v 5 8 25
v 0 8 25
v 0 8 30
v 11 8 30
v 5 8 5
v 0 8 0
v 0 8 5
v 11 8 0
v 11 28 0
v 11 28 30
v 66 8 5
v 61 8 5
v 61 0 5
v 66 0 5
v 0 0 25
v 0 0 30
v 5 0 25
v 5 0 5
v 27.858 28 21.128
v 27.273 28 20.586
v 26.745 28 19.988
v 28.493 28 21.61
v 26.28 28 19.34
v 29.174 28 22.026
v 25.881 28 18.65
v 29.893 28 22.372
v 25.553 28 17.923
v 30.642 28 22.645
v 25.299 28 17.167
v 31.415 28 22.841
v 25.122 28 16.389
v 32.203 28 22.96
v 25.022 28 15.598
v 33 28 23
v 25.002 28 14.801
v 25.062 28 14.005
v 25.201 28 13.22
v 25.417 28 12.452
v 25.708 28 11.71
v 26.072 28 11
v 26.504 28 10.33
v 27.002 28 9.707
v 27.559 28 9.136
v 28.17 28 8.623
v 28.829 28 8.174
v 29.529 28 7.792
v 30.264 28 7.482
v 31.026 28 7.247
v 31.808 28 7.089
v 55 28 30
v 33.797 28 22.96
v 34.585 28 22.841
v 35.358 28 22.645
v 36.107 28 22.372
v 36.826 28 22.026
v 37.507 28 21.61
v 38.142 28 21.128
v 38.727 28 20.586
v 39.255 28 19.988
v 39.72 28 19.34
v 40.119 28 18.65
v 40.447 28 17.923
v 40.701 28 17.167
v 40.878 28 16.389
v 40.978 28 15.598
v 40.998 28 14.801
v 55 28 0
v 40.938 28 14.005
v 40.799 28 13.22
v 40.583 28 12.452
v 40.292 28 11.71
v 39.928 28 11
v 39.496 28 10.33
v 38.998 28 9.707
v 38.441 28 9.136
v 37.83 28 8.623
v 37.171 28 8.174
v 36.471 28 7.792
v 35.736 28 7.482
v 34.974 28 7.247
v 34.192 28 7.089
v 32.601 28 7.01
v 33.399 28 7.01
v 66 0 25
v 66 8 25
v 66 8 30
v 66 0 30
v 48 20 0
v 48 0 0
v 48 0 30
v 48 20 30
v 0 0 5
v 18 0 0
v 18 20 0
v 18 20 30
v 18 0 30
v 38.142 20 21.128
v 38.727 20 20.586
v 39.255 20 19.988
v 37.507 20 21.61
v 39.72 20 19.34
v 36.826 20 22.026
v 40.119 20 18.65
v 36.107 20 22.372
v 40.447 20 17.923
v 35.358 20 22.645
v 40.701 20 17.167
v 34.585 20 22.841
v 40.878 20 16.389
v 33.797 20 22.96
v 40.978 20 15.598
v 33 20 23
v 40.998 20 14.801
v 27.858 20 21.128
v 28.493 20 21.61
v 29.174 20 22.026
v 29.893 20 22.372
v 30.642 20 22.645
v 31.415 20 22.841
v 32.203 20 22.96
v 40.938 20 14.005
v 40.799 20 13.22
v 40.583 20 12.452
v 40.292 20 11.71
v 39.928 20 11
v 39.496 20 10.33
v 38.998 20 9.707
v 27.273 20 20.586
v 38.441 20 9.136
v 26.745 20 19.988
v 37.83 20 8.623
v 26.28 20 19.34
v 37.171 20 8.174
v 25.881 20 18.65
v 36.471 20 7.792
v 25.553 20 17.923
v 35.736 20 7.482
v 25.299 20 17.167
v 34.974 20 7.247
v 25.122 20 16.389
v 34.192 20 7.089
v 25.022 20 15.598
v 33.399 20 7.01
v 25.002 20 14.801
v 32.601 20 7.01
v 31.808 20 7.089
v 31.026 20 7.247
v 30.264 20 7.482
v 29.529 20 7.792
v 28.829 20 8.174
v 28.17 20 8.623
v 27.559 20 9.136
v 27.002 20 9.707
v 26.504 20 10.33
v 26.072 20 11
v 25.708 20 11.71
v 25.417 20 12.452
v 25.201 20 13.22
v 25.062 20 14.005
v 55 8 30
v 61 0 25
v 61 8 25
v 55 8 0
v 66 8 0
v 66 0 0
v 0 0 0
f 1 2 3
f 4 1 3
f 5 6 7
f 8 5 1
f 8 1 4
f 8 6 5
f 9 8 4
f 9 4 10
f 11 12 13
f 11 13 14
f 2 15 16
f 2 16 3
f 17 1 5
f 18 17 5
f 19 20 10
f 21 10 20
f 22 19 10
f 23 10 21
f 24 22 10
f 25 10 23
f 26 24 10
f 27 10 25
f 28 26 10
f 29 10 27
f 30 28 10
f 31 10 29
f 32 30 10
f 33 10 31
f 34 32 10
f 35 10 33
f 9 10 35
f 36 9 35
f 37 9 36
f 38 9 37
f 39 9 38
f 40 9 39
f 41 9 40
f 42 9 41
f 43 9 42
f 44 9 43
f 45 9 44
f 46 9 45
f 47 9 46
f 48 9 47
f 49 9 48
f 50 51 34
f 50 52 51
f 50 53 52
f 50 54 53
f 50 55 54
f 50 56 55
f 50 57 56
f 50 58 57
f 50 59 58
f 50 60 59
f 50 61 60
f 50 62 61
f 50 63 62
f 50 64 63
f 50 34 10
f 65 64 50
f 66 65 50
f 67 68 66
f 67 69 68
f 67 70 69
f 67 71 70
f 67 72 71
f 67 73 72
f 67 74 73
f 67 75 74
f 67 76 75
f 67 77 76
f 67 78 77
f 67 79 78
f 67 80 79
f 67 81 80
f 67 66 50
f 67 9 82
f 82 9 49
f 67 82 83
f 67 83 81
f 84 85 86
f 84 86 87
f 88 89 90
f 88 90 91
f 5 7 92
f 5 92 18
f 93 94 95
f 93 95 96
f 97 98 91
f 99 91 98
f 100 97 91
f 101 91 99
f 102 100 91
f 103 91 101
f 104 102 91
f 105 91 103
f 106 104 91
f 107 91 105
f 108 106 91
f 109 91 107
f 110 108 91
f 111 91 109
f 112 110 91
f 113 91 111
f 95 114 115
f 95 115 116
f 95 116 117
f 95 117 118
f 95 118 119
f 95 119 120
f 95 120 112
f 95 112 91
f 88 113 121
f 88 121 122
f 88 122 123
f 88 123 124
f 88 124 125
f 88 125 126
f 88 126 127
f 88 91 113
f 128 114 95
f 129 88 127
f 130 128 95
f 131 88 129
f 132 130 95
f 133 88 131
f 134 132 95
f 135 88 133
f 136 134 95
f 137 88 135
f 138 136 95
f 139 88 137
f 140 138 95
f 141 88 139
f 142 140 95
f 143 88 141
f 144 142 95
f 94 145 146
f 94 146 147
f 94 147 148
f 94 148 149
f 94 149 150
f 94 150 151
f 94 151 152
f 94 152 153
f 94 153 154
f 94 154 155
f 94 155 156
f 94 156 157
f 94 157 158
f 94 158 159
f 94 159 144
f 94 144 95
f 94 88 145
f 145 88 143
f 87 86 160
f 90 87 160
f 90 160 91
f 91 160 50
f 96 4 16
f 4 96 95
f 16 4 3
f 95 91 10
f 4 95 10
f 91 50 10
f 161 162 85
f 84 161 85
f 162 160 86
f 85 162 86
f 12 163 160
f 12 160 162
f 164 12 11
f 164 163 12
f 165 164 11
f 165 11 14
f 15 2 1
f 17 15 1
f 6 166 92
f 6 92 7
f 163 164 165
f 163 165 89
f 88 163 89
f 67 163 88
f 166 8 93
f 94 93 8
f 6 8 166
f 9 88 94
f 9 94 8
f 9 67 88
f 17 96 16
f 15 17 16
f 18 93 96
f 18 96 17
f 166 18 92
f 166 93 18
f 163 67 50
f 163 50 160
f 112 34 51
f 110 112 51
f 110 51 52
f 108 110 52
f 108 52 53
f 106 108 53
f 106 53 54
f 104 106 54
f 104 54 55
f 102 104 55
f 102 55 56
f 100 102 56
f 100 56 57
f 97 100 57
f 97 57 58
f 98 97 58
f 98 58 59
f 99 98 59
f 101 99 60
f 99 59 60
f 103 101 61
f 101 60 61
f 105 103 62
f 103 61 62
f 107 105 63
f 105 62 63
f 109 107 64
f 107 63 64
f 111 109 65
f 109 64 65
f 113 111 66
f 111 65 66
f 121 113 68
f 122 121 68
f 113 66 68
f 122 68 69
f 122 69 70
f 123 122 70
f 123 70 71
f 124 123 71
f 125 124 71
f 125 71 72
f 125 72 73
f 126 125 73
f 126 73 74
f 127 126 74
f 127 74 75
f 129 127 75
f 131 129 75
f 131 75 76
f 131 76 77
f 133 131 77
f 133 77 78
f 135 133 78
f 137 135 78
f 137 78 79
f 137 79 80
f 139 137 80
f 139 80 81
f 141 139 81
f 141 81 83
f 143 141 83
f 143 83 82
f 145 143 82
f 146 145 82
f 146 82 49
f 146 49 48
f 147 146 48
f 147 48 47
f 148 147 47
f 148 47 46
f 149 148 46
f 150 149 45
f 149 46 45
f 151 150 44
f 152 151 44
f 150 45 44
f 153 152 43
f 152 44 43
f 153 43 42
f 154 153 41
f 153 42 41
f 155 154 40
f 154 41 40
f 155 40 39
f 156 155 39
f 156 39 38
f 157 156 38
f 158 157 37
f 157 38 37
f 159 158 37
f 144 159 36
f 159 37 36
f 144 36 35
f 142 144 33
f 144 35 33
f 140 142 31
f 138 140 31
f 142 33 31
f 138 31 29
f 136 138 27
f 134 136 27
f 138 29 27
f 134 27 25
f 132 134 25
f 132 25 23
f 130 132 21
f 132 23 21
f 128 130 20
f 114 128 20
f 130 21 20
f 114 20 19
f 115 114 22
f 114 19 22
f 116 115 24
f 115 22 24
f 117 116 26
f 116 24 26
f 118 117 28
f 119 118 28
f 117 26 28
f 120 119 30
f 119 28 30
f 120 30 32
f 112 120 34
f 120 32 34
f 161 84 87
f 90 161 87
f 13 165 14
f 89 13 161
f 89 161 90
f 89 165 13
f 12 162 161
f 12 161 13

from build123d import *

# Parameters (mm, degrees)
EXTRUDE_1_DEPTH     = 30
SKETCH_3_W          = 5
SKETCH_3_H          = 20
CUT_EXTRUDE_1_DEPTH = 76.206382708
SKETCH_4_R          = 8
CUT_EXTRUDE_2_DEPTH = 78.717436911


with BuildPart() as part:
    # Эскиз1 → Бобышка-Вытянуть1 (new body)
    with BuildSketch(Plane.XY):
        Polygon((0, 0), (0, 8), (11, 8), (11, 28), (55, 28), (55, 8), (66, 8), (66, 0), (48, 0), (48, 20), (18, 20), (18, 0), align=None)
    extrude(amount=EXTRUDE_1_DEPTH)

    # Эскиз3 → Вырез-Вытянуть1 (cut, through all)
    with BuildSketch(Plane(origin=(0, 8, 0), x_dir=(1, 0, 0), z_dir=(0, 1, 0))):
        with Locations((2.5, -15)):
            Rectangle(SKETCH_3_W, SKETCH_3_H)
        with Locations((63.5, -15)):
            Rectangle(SKETCH_3_W, SKETCH_3_H)
    extrude(amount=-CUT_EXTRUDE_1_DEPTH, mode=Mode.SUBTRACT)

    # Эскиз4 → Вырез-Вытянуть2 (cut, through all)
    with BuildSketch(Plane(origin=(0, 28, 0), x_dir=(1, 0, 0), z_dir=(0, 1, 0))):
        with Locations(Location((33, -15, 0), (0, 0, 270))):
            Circle(SKETCH_4_R)
    extrude(amount=-CUT_EXTRUDE_2_DEPTH, mode=Mode.SUBTRACT)


solid = part.part
